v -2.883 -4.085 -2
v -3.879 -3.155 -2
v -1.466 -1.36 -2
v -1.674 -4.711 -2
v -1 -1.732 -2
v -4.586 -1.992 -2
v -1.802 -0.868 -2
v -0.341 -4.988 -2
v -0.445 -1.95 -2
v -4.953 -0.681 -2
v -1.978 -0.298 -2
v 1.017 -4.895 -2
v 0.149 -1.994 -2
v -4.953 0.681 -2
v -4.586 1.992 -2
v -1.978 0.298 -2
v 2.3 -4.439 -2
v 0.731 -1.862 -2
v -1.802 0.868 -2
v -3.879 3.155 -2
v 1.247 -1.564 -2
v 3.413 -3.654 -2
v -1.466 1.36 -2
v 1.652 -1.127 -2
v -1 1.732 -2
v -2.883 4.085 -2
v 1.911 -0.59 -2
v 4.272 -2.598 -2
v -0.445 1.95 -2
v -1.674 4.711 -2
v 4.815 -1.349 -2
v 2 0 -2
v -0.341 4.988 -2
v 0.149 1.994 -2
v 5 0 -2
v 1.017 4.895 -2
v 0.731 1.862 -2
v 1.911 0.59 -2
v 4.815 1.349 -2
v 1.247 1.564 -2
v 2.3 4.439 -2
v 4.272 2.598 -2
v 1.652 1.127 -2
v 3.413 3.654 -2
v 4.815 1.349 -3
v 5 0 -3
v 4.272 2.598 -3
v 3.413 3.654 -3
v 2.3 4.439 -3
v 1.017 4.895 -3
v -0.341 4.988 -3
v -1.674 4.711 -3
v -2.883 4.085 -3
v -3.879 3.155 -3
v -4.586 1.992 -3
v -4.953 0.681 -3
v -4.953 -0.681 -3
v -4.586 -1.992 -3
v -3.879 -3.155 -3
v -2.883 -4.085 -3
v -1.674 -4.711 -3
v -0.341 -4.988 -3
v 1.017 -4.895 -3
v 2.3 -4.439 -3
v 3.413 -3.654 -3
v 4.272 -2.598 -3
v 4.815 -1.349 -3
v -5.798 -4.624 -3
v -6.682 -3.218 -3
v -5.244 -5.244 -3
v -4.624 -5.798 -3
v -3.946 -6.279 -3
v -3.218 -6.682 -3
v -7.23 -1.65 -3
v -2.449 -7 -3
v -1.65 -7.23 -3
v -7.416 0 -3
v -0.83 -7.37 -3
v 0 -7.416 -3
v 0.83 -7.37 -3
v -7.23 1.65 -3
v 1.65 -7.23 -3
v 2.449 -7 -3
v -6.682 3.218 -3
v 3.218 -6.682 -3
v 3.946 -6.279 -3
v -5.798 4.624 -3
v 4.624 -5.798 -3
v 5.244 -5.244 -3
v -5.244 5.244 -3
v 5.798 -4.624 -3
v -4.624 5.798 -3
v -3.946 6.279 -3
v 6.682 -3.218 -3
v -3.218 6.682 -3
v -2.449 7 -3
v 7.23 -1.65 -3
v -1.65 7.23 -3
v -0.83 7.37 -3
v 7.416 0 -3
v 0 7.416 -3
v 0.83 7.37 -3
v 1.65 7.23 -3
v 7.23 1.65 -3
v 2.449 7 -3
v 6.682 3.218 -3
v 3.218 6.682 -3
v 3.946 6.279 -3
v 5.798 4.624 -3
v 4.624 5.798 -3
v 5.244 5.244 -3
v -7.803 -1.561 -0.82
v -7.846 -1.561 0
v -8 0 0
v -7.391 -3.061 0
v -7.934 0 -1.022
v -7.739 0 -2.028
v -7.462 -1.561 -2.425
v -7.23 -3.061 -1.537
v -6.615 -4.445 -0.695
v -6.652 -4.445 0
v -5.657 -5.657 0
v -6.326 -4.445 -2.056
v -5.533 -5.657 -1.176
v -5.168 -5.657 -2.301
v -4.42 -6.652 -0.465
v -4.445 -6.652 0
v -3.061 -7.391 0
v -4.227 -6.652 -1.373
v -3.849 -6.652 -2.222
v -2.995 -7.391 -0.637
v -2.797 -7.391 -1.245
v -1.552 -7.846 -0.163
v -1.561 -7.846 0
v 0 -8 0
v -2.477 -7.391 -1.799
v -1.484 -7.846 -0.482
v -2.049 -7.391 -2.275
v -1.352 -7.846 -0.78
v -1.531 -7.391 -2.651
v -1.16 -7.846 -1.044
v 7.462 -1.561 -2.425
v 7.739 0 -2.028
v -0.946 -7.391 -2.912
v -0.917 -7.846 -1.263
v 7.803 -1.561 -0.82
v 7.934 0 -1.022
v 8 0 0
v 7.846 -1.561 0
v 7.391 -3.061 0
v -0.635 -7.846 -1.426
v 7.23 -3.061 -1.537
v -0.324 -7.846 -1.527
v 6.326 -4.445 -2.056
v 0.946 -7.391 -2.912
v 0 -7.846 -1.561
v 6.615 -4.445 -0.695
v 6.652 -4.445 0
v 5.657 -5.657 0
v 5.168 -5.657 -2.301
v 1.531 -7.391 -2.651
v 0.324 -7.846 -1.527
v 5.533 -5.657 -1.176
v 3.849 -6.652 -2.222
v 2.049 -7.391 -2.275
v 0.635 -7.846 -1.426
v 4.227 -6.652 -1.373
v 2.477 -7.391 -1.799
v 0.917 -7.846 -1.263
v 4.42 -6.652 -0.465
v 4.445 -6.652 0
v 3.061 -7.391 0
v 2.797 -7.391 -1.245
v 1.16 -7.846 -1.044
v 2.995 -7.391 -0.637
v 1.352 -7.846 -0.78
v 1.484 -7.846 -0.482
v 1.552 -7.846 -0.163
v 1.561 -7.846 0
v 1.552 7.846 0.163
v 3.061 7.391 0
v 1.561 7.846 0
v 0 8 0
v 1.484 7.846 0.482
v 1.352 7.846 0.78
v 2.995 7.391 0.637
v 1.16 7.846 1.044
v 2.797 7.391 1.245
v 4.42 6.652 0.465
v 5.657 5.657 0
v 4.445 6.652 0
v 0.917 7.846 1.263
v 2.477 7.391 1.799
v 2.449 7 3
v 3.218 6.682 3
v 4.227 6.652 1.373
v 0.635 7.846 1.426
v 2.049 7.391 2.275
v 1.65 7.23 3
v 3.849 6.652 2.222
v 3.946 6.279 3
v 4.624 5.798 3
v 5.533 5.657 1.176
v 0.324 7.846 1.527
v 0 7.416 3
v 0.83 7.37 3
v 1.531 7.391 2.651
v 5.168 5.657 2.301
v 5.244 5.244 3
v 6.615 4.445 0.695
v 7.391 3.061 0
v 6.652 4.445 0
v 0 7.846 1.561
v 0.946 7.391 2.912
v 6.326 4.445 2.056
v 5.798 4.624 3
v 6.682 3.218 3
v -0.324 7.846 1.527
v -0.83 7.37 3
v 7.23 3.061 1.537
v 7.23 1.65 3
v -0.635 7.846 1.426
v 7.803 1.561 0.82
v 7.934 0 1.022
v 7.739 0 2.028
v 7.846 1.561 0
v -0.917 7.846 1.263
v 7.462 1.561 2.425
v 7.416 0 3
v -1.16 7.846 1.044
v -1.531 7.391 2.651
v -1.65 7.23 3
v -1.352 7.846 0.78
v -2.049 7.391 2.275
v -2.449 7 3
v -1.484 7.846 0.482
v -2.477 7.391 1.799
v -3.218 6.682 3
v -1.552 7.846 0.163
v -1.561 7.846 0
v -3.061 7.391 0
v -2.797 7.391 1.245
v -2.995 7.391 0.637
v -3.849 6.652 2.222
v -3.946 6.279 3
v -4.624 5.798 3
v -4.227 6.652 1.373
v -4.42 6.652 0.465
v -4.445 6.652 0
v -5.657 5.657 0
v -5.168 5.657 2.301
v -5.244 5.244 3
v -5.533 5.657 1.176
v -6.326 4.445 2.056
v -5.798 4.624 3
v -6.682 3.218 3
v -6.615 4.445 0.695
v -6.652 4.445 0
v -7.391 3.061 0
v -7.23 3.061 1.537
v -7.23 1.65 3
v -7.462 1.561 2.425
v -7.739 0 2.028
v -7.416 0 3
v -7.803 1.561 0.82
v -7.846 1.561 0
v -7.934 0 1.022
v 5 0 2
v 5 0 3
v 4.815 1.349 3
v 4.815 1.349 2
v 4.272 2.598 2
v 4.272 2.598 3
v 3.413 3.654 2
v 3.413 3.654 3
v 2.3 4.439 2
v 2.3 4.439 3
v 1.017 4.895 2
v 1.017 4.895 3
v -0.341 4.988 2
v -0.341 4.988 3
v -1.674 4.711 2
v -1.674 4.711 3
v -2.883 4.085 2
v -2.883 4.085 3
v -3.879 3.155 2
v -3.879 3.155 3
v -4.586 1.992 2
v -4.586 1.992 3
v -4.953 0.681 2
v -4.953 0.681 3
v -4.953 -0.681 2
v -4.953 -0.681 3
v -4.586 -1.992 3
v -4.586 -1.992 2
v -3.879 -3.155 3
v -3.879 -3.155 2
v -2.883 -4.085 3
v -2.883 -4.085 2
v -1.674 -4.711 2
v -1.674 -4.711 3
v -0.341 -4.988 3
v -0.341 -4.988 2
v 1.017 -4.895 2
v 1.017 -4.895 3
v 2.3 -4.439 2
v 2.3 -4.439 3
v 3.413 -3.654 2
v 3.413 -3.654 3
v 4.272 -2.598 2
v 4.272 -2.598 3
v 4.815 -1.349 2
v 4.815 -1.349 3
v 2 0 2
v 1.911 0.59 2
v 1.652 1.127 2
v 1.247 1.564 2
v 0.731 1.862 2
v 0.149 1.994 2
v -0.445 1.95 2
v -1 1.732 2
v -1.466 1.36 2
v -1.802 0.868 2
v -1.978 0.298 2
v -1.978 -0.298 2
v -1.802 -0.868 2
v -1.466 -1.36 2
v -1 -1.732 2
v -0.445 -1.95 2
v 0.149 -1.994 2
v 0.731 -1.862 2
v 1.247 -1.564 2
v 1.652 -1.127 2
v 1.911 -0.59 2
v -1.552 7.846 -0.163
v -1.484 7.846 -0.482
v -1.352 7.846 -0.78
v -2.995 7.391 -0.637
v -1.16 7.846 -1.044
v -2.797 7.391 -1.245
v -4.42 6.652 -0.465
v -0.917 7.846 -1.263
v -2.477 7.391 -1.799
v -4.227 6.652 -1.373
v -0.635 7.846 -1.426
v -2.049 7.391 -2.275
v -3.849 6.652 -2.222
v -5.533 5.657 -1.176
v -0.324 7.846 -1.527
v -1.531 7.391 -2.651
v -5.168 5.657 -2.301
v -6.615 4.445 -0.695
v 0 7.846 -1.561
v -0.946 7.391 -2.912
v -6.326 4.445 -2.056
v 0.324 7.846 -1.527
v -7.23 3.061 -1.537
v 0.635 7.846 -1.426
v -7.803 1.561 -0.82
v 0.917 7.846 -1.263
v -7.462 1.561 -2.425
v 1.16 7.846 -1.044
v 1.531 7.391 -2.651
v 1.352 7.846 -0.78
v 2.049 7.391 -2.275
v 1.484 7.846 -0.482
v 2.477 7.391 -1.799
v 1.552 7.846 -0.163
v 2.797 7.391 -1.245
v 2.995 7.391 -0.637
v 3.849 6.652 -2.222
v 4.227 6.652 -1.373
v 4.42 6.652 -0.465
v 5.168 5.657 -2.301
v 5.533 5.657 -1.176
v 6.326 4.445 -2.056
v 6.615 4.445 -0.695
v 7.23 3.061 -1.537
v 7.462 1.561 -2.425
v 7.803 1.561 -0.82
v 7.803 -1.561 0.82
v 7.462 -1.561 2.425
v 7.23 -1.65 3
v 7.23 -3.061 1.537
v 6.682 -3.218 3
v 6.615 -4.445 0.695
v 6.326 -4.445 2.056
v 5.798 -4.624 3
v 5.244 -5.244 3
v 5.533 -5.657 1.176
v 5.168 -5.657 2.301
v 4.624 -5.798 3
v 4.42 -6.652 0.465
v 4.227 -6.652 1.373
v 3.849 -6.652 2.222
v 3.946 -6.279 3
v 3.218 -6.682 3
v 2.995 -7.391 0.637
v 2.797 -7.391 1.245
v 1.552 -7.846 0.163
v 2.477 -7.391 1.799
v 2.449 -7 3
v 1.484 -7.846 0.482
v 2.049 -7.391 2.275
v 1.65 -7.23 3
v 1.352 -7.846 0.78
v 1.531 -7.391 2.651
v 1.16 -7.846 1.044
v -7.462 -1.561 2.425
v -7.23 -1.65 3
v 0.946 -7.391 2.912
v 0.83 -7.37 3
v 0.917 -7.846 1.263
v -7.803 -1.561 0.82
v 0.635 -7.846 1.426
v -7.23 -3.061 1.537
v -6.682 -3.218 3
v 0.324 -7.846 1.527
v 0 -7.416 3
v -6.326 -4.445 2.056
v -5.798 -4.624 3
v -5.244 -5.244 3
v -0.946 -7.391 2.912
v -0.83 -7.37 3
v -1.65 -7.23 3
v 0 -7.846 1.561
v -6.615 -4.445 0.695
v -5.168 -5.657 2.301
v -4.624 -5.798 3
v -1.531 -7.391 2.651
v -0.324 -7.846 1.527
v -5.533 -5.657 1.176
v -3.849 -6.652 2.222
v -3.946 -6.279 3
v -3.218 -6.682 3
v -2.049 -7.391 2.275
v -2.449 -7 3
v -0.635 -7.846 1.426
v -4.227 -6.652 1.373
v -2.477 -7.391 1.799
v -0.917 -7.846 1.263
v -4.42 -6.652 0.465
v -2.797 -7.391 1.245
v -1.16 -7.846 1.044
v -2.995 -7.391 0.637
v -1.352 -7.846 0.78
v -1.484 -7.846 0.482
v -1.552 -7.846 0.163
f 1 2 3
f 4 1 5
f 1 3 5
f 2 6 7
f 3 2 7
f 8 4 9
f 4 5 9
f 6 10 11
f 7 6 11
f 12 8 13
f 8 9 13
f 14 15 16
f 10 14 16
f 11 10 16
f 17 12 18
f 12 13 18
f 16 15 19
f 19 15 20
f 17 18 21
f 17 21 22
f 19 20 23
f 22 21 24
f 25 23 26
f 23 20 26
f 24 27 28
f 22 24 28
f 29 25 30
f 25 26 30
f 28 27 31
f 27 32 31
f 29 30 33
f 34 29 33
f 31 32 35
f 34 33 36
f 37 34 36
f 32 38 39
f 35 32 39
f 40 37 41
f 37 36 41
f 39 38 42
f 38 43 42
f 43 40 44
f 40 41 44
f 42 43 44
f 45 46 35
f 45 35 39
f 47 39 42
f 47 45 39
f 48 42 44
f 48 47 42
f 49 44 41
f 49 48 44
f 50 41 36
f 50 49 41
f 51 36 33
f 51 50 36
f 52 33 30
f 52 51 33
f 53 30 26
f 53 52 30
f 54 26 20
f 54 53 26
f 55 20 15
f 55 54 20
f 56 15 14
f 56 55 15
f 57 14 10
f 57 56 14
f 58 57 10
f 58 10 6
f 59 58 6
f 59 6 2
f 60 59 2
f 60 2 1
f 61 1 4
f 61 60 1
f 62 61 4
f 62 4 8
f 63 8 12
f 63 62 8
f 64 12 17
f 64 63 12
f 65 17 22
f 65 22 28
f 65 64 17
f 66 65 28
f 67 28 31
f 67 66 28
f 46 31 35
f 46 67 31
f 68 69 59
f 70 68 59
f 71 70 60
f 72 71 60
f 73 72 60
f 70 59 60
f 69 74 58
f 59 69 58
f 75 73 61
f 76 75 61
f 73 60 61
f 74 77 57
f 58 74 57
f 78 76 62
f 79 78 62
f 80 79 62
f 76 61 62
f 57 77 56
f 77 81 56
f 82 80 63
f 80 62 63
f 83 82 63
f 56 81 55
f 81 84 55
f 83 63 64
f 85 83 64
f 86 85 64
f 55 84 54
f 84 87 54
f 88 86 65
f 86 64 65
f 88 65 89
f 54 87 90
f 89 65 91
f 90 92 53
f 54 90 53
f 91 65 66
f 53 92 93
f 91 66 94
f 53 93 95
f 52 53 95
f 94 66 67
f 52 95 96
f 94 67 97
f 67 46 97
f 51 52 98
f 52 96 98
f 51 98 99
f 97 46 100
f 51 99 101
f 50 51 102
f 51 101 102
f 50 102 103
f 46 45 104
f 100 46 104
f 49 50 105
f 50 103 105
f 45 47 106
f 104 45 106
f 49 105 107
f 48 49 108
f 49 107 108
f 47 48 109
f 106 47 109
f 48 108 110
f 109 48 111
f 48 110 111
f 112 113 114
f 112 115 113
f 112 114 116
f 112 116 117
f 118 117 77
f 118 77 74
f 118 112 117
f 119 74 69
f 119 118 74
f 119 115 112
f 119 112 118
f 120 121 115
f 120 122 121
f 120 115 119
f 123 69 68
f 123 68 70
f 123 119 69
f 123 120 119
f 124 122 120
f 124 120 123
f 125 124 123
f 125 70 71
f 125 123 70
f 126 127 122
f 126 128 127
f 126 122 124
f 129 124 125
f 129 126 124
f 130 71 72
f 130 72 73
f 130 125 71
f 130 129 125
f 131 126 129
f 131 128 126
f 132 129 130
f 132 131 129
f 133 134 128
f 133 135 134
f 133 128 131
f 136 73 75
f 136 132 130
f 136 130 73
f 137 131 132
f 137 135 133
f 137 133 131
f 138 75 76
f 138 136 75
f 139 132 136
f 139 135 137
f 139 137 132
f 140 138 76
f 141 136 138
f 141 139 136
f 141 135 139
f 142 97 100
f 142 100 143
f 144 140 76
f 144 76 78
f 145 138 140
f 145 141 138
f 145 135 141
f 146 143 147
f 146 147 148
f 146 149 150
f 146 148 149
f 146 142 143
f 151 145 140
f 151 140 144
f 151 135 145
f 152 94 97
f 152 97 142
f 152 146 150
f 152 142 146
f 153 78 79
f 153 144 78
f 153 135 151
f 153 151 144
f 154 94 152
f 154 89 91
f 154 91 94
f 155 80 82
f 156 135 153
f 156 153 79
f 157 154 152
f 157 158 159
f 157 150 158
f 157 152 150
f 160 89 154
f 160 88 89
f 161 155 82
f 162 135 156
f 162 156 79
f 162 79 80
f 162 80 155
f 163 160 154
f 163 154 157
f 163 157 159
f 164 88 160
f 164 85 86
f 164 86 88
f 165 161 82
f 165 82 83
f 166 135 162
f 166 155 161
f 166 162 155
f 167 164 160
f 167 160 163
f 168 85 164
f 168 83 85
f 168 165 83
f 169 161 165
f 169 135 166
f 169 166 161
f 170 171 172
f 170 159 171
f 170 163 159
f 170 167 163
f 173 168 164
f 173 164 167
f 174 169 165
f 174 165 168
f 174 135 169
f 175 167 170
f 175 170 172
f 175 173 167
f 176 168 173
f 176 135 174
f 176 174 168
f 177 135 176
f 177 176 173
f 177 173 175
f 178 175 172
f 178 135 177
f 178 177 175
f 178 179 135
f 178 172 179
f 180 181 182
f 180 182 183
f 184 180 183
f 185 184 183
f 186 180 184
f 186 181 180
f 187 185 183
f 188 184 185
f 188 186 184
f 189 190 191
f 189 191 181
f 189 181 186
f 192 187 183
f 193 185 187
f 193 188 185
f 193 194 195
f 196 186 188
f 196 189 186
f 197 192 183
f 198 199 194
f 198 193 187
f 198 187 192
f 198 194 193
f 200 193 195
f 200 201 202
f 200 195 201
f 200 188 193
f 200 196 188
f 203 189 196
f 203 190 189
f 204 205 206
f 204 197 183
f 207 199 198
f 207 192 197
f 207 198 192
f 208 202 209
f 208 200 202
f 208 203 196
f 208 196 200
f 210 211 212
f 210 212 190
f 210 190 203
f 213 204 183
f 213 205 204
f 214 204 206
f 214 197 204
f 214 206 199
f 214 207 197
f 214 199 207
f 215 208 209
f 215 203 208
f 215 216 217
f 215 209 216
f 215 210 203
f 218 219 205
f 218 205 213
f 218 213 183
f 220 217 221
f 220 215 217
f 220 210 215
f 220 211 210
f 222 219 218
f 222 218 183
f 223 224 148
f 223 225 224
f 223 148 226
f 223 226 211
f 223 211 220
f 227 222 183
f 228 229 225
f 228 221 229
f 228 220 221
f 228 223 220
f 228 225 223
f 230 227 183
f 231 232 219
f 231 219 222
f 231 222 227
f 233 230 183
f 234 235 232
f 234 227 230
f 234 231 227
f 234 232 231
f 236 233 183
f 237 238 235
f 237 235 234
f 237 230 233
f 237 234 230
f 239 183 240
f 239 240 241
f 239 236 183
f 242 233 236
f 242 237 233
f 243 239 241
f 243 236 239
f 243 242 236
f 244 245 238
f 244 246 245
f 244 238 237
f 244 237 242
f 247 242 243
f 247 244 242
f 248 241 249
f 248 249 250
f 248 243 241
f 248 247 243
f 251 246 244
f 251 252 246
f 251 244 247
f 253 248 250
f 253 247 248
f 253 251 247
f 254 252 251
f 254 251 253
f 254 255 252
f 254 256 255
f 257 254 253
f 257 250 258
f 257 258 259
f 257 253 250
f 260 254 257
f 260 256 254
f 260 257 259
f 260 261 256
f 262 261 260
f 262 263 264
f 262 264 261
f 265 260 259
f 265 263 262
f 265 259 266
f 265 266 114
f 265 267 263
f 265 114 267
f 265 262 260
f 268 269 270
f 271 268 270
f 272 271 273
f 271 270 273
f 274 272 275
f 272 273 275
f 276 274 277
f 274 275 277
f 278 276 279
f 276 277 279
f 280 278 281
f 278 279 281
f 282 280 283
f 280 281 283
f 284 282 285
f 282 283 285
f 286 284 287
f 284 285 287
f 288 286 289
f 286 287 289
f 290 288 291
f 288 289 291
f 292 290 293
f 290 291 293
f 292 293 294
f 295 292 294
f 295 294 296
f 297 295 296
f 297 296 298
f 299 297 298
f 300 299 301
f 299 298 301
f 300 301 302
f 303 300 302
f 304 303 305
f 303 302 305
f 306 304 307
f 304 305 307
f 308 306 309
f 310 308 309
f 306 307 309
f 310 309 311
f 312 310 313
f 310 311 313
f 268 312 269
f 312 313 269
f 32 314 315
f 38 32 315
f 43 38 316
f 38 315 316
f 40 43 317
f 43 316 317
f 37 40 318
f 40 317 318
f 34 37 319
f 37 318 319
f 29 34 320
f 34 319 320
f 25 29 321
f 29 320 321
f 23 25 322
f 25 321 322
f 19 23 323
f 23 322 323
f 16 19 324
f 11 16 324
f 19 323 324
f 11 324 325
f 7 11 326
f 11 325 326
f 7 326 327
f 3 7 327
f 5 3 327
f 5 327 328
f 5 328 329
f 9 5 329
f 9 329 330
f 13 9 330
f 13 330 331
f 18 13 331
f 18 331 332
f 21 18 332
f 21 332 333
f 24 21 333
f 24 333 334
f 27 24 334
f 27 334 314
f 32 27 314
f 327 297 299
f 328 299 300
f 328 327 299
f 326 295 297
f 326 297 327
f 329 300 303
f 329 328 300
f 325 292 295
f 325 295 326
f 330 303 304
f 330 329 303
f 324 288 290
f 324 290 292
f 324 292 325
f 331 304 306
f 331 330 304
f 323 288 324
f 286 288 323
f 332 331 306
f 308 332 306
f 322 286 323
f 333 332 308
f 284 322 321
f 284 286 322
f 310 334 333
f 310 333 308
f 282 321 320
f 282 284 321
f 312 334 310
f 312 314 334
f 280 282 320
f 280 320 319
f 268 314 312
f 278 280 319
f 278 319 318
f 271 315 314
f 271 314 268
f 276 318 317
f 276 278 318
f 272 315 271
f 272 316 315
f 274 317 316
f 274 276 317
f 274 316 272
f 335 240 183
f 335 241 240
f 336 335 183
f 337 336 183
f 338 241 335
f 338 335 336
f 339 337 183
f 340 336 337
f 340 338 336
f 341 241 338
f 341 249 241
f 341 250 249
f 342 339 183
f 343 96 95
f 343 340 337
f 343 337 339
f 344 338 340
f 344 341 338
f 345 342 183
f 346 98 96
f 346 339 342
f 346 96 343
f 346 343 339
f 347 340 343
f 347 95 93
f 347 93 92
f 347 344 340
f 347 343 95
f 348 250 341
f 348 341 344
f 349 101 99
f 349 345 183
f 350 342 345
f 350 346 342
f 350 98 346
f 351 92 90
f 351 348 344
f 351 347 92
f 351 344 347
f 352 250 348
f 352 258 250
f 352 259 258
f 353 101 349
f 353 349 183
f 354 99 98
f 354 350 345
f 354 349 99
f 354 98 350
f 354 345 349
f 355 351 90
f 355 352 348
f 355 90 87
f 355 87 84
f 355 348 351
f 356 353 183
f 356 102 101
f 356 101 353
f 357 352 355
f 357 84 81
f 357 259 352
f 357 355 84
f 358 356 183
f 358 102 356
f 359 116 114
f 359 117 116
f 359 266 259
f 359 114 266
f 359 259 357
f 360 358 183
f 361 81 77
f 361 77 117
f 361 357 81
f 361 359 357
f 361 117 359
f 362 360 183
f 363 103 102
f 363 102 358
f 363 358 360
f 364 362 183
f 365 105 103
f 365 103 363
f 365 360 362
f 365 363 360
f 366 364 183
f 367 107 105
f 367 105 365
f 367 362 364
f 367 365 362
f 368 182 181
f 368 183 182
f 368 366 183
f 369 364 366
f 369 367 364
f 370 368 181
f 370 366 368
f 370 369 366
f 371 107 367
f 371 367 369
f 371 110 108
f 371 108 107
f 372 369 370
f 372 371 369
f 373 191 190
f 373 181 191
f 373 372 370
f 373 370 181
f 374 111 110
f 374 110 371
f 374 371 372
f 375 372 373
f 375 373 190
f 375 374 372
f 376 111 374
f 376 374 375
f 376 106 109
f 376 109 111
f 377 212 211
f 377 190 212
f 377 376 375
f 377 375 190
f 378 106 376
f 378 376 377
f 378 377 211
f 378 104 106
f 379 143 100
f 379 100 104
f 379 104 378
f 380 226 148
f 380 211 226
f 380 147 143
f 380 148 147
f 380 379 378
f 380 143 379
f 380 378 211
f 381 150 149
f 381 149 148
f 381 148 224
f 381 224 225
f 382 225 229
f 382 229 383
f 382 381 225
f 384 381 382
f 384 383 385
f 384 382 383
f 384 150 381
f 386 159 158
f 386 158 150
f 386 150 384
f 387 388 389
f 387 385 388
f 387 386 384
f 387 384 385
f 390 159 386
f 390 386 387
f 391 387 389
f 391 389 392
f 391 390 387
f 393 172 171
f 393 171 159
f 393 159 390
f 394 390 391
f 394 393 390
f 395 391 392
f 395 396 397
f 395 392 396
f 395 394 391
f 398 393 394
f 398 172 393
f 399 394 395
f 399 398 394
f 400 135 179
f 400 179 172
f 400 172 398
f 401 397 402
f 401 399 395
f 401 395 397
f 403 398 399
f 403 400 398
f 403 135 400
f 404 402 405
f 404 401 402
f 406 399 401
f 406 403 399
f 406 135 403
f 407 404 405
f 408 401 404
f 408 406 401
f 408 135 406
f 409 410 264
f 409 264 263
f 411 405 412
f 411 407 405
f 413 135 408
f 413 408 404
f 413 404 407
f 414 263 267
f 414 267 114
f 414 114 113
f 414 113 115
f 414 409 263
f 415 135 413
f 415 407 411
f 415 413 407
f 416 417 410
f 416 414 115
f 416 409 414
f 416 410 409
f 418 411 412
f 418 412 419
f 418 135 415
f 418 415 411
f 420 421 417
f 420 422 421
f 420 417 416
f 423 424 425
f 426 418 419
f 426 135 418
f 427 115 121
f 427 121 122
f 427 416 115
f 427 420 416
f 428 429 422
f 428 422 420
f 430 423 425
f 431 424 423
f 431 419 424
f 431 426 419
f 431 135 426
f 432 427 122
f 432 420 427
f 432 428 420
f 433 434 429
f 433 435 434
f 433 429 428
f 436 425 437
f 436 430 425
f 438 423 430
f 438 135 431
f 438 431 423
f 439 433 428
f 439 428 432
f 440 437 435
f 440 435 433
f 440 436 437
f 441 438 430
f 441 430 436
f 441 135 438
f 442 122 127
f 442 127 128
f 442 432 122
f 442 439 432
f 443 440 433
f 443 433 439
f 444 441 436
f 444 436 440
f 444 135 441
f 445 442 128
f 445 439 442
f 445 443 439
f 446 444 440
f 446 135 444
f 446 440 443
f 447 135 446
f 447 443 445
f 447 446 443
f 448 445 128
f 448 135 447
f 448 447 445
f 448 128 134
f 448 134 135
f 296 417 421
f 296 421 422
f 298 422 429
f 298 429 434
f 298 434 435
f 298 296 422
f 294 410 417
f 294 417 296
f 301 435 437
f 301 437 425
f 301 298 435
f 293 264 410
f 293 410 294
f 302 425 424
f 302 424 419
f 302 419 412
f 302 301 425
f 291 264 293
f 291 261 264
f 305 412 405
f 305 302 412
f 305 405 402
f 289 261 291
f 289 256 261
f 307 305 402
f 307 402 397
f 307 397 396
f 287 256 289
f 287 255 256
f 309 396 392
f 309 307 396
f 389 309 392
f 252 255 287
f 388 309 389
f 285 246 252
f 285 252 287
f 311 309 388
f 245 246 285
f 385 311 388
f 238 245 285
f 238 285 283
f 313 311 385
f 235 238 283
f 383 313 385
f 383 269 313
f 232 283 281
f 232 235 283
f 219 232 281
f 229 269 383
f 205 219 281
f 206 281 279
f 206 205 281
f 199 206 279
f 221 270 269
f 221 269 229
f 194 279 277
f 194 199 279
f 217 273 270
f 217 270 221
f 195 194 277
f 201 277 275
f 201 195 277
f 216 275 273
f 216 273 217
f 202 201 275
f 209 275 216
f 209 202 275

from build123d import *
from build123d.topology import SkipClean

# Parameters (mm, degrees)
CUT_EXTRUDE_START   = 3
SKETCH_2_R          = 9.058655207
CUT_EXTRUDE_1_DEPTH = 10
CUT_EXTRUDE_START_2 = -3
SKETCH_2_2_R        = 9.058655207
CUT_EXTRUDE_2_DEPTH = 10
SKETCH_3_R          = 5
CUT_EXTRUDE_3_DEPTH = 1
SKETCH_4_R          = 2
CUT_EXTRUDE_4_DEPTH = 5


with BuildPart() as part:
    # 草图1 → 旋转3 (revolve)
    with SkipClean():  # the faces are left unmerged after this step: merging them gives an invalid solid
        with BuildSketch(Plane.XY):
            with BuildLine():
                ThreePointArc((8, 0), (5.656854249, 5.656854249), (0, 8))
                Line((0, 8), (0, -8))
                ThreePointArc((0, -8), (5.656854249, -5.656854249), (8, 0))
            make_face()
            with BuildLine():
                Line((0, -8), (0, 8))
                ThreePointArc((0, 8), (-8, 0), (0, -8))
            make_face()
        revolve(axis=Axis((0, 8, 0), (0, -1, 0)))

    # 草图2 → 切除-拉伸1 (cut)
    with SkipClean():  # the faces are left unmerged after this step: merging them gives an invalid solid
        with BuildSketch(Plane.XY.offset(CUT_EXTRUDE_START)):
            Circle(SKETCH_2_R)
        extrude(amount=CUT_EXTRUDE_1_DEPTH, mode=Mode.SUBTRACT)

    # 草图2<2> → 切除-拉伸2 (cut)
    with SkipClean():  # the faces are left unmerged after this step: merging them gives an invalid solid
        with BuildSketch(Plane.XY.offset(CUT_EXTRUDE_START_2)):
            Circle(SKETCH_2_2_R)
        extrude(amount=-CUT_EXTRUDE_2_DEPTH, mode=Mode.SUBTRACT)

    # 草图3 → 切除-拉伸3 (cut)
    with SkipClean():  # the faces are left unmerged after this step: merging them gives an invalid solid
        with BuildSketch(Plane.XY.offset(3)):
            Circle(SKETCH_3_R)
        cut_extrude_3 = extrude(amount=-CUT_EXTRUDE_3_DEPTH, mode=Mode.SUBTRACT)

    # 镜向1: 切除-拉伸3 across plane
    with SkipClean():  # the faces are left unmerged after this step: merging them gives an invalid solid
        add(cut_extrude_3.mirror(Plane.XY), mode=Mode.SUBTRACT)

    # 草图4 → 切除-拉伸4 (cut)
    with SkipClean():  # the faces are left unmerged after this step: merging them gives an invalid solid
        with BuildSketch(Plane.XY.offset(2)):
            Circle(SKETCH_4_R)
        extrude(amount=-CUT_EXTRUDE_4_DEPTH, mode=Mode.SUBTRACT)


solid = part.part
